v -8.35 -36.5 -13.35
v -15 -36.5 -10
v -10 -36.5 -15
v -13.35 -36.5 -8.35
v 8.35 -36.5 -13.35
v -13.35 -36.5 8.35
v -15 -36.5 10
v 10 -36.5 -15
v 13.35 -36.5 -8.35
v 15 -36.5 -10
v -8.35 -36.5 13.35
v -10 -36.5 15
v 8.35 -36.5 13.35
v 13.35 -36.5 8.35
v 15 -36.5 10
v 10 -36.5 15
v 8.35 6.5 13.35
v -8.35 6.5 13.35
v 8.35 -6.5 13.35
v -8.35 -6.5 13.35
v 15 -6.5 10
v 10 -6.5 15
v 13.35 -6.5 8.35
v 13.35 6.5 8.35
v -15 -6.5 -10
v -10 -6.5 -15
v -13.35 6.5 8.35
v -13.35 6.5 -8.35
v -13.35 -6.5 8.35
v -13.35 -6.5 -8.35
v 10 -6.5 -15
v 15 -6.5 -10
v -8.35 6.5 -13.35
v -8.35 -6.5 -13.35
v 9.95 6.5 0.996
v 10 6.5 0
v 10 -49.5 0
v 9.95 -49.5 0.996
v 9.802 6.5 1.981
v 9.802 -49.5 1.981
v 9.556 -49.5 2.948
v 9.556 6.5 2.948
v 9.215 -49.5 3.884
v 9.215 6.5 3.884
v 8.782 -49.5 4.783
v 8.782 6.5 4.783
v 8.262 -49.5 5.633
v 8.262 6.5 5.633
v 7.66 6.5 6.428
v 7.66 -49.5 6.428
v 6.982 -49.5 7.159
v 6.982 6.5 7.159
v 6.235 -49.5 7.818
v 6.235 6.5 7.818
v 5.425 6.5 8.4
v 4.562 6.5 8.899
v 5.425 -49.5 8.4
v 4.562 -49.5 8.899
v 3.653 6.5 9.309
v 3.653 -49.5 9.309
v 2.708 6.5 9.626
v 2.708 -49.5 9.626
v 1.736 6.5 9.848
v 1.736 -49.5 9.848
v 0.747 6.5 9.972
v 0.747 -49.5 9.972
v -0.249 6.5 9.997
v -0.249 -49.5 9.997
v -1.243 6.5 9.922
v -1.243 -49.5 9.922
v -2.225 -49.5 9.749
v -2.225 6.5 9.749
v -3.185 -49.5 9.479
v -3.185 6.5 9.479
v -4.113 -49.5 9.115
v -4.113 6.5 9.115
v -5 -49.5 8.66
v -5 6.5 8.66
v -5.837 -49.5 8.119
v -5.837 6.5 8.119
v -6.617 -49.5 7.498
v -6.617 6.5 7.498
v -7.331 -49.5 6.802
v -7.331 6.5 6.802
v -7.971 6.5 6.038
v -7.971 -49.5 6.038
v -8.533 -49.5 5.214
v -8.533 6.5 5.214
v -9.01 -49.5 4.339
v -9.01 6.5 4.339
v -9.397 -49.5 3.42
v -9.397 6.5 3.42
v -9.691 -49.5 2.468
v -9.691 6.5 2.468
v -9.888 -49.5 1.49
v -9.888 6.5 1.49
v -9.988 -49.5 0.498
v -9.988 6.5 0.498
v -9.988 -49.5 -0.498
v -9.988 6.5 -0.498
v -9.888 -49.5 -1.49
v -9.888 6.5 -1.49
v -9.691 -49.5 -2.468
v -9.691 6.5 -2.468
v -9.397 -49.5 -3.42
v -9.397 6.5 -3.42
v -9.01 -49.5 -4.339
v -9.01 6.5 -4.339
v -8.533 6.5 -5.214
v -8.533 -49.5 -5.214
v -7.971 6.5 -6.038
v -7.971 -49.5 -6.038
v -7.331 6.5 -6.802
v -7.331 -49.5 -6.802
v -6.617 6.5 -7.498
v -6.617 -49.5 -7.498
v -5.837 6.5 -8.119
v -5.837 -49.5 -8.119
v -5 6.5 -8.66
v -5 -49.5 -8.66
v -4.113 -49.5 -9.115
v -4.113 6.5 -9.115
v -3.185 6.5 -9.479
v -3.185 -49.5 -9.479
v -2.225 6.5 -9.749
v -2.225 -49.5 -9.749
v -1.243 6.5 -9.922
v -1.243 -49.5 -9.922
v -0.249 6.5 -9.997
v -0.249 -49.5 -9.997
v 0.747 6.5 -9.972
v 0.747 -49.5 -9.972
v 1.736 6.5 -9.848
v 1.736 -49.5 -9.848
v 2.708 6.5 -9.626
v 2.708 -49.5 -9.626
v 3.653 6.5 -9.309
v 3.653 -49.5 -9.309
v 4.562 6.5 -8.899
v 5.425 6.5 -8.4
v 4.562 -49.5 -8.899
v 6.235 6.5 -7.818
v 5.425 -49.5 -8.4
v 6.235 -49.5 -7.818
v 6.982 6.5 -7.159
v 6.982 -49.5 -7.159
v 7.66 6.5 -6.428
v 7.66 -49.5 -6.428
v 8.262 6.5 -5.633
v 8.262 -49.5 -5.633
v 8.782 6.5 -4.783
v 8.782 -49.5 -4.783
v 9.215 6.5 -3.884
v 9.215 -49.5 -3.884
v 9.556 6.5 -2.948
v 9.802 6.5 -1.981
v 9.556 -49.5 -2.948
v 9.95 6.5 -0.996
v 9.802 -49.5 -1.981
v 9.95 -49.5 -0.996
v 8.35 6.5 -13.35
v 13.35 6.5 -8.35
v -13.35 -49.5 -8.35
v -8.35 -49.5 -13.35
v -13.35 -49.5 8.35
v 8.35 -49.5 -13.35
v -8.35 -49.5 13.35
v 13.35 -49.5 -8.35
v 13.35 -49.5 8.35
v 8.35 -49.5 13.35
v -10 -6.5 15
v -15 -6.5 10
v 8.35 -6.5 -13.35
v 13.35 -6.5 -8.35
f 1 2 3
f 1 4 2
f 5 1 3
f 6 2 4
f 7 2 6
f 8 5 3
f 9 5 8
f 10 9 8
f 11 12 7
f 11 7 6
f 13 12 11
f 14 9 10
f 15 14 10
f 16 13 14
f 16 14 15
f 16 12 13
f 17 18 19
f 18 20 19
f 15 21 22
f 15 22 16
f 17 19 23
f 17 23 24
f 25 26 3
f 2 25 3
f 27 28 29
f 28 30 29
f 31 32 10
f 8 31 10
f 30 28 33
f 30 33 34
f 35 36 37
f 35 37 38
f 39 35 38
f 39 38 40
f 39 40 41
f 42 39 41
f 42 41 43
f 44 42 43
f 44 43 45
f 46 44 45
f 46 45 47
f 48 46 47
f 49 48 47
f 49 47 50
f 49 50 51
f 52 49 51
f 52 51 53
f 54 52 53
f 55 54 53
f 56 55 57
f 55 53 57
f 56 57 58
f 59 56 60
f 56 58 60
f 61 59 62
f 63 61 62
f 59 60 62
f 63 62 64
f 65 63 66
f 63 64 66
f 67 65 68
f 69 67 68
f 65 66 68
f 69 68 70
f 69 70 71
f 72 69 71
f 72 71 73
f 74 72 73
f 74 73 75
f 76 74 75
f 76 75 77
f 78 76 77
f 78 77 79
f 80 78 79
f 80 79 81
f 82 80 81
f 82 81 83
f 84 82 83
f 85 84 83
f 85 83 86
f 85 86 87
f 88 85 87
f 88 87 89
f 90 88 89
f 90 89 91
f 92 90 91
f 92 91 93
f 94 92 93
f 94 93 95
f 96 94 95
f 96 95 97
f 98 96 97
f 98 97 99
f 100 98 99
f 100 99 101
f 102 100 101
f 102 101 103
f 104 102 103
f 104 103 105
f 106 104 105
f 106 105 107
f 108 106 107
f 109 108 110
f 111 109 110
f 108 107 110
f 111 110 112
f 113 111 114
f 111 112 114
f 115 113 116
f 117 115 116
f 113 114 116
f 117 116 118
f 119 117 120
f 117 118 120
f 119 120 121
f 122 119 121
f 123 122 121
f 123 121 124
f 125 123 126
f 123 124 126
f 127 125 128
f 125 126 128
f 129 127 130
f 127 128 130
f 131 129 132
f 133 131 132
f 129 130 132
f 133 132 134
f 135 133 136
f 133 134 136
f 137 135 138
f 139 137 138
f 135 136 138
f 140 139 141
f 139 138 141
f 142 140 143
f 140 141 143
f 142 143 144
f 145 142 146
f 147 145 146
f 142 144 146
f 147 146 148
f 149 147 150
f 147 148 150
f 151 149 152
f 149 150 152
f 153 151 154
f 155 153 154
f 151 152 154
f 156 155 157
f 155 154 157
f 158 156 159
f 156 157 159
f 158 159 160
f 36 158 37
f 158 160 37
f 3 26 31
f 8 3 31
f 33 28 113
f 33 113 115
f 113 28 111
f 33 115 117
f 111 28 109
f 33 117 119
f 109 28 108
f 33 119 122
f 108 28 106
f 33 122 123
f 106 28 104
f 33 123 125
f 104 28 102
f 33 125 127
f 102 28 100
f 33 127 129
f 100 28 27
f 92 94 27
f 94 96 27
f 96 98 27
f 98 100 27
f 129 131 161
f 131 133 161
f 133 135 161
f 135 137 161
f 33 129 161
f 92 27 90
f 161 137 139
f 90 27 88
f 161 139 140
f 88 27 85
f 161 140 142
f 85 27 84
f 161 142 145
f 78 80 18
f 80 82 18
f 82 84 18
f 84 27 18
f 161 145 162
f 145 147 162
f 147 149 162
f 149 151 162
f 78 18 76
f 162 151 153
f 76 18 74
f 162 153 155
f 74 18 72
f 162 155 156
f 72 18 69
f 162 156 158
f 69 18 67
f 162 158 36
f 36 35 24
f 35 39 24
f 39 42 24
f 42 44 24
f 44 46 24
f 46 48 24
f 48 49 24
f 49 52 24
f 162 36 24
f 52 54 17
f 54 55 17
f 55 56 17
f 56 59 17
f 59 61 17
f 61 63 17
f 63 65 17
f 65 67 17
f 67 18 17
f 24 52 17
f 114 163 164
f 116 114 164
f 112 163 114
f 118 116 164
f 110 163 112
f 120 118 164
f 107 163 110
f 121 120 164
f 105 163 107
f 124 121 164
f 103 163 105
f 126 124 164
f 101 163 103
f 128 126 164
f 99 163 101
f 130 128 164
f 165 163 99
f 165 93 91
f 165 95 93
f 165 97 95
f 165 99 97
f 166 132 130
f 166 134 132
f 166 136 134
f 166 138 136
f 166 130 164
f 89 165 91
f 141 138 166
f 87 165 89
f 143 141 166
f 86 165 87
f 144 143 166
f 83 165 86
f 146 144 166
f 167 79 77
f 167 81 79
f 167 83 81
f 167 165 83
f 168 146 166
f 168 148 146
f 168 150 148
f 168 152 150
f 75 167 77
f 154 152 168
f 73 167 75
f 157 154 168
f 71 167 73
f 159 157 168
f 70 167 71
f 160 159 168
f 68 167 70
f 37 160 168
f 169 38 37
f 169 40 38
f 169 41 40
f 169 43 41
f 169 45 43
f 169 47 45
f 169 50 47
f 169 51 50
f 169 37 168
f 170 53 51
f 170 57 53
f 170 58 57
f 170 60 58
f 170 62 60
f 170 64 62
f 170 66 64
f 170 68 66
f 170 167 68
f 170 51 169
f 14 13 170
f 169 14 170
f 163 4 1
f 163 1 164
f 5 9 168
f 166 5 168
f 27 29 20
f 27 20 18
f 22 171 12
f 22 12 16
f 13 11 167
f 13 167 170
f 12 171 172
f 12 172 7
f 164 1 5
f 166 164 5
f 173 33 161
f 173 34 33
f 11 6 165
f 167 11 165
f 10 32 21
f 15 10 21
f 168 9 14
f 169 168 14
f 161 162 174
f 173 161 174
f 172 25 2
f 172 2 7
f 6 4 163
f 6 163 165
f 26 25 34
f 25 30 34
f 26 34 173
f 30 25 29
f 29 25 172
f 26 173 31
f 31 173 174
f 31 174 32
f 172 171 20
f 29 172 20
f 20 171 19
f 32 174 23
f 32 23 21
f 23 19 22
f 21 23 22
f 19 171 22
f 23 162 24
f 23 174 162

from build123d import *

# Parameters (mm, degrees)
F0_W     = 26.7
F0_H     = 26.7
F1_DEPTH = 6.5
F2_W     = 30
F2_H     = 30
F3_DEPTH = 30
F4_W     = 26.7
F4_H     = 26.7
F5_DEPTH = 13
F6_SIZE  = 5
F7_R     = 10
F8_DEPTH = 56.001


with BuildPart() as f1:
    # F0 (on Front) → F1 (new body, symmetric)
    with BuildSketch(Plane.XZ):
        Rectangle(F0_W, F0_H)
    extrude(amount=F1_DEPTH, both=True)

    # F2 (on face) → F3 (join)
    with BuildSketch(Plane.XZ.offset(6.5)):
        Rectangle(F2_W, F2_H)
    extrude(amount=F3_DEPTH)

    # F4 (on face) → F5 (join)
    with BuildSketch(Plane.XZ.offset(36.5)):
        Rectangle(F4_W, F4_H)
    extrude(amount=F5_DEPTH)

    # F6
    f6_edges = [f1.edges().sort_by_distance(p)[0] for p in [
        (13.35, -43, 13.35),
        (13.35, 0, 13.35),
        (13.35, -43, -13.35),
        (13.35, 0, -13.35),
        (-13.35, -43, 13.35),
        (-13.35, -43, -13.35),
        (-13.35, 0, -13.35),
        (-13.35, 0, 13.35),
        (15, -21.5, 15),
        (-15, -21.5, 15),
        (15, -21.5, -15),
        (-15, -21.5, -15),
    ]]
    chamfer(f6_edges, length=F6_SIZE)

    # F7 (on face) → F8 (cut, through all)
    with BuildSketch(Plane.XZ.offset(49.5)):
        Circle(F7_R)
    extrude(amount=-F8_DEPTH, mode=Mode.SUBTRACT)


solid = f1.part
